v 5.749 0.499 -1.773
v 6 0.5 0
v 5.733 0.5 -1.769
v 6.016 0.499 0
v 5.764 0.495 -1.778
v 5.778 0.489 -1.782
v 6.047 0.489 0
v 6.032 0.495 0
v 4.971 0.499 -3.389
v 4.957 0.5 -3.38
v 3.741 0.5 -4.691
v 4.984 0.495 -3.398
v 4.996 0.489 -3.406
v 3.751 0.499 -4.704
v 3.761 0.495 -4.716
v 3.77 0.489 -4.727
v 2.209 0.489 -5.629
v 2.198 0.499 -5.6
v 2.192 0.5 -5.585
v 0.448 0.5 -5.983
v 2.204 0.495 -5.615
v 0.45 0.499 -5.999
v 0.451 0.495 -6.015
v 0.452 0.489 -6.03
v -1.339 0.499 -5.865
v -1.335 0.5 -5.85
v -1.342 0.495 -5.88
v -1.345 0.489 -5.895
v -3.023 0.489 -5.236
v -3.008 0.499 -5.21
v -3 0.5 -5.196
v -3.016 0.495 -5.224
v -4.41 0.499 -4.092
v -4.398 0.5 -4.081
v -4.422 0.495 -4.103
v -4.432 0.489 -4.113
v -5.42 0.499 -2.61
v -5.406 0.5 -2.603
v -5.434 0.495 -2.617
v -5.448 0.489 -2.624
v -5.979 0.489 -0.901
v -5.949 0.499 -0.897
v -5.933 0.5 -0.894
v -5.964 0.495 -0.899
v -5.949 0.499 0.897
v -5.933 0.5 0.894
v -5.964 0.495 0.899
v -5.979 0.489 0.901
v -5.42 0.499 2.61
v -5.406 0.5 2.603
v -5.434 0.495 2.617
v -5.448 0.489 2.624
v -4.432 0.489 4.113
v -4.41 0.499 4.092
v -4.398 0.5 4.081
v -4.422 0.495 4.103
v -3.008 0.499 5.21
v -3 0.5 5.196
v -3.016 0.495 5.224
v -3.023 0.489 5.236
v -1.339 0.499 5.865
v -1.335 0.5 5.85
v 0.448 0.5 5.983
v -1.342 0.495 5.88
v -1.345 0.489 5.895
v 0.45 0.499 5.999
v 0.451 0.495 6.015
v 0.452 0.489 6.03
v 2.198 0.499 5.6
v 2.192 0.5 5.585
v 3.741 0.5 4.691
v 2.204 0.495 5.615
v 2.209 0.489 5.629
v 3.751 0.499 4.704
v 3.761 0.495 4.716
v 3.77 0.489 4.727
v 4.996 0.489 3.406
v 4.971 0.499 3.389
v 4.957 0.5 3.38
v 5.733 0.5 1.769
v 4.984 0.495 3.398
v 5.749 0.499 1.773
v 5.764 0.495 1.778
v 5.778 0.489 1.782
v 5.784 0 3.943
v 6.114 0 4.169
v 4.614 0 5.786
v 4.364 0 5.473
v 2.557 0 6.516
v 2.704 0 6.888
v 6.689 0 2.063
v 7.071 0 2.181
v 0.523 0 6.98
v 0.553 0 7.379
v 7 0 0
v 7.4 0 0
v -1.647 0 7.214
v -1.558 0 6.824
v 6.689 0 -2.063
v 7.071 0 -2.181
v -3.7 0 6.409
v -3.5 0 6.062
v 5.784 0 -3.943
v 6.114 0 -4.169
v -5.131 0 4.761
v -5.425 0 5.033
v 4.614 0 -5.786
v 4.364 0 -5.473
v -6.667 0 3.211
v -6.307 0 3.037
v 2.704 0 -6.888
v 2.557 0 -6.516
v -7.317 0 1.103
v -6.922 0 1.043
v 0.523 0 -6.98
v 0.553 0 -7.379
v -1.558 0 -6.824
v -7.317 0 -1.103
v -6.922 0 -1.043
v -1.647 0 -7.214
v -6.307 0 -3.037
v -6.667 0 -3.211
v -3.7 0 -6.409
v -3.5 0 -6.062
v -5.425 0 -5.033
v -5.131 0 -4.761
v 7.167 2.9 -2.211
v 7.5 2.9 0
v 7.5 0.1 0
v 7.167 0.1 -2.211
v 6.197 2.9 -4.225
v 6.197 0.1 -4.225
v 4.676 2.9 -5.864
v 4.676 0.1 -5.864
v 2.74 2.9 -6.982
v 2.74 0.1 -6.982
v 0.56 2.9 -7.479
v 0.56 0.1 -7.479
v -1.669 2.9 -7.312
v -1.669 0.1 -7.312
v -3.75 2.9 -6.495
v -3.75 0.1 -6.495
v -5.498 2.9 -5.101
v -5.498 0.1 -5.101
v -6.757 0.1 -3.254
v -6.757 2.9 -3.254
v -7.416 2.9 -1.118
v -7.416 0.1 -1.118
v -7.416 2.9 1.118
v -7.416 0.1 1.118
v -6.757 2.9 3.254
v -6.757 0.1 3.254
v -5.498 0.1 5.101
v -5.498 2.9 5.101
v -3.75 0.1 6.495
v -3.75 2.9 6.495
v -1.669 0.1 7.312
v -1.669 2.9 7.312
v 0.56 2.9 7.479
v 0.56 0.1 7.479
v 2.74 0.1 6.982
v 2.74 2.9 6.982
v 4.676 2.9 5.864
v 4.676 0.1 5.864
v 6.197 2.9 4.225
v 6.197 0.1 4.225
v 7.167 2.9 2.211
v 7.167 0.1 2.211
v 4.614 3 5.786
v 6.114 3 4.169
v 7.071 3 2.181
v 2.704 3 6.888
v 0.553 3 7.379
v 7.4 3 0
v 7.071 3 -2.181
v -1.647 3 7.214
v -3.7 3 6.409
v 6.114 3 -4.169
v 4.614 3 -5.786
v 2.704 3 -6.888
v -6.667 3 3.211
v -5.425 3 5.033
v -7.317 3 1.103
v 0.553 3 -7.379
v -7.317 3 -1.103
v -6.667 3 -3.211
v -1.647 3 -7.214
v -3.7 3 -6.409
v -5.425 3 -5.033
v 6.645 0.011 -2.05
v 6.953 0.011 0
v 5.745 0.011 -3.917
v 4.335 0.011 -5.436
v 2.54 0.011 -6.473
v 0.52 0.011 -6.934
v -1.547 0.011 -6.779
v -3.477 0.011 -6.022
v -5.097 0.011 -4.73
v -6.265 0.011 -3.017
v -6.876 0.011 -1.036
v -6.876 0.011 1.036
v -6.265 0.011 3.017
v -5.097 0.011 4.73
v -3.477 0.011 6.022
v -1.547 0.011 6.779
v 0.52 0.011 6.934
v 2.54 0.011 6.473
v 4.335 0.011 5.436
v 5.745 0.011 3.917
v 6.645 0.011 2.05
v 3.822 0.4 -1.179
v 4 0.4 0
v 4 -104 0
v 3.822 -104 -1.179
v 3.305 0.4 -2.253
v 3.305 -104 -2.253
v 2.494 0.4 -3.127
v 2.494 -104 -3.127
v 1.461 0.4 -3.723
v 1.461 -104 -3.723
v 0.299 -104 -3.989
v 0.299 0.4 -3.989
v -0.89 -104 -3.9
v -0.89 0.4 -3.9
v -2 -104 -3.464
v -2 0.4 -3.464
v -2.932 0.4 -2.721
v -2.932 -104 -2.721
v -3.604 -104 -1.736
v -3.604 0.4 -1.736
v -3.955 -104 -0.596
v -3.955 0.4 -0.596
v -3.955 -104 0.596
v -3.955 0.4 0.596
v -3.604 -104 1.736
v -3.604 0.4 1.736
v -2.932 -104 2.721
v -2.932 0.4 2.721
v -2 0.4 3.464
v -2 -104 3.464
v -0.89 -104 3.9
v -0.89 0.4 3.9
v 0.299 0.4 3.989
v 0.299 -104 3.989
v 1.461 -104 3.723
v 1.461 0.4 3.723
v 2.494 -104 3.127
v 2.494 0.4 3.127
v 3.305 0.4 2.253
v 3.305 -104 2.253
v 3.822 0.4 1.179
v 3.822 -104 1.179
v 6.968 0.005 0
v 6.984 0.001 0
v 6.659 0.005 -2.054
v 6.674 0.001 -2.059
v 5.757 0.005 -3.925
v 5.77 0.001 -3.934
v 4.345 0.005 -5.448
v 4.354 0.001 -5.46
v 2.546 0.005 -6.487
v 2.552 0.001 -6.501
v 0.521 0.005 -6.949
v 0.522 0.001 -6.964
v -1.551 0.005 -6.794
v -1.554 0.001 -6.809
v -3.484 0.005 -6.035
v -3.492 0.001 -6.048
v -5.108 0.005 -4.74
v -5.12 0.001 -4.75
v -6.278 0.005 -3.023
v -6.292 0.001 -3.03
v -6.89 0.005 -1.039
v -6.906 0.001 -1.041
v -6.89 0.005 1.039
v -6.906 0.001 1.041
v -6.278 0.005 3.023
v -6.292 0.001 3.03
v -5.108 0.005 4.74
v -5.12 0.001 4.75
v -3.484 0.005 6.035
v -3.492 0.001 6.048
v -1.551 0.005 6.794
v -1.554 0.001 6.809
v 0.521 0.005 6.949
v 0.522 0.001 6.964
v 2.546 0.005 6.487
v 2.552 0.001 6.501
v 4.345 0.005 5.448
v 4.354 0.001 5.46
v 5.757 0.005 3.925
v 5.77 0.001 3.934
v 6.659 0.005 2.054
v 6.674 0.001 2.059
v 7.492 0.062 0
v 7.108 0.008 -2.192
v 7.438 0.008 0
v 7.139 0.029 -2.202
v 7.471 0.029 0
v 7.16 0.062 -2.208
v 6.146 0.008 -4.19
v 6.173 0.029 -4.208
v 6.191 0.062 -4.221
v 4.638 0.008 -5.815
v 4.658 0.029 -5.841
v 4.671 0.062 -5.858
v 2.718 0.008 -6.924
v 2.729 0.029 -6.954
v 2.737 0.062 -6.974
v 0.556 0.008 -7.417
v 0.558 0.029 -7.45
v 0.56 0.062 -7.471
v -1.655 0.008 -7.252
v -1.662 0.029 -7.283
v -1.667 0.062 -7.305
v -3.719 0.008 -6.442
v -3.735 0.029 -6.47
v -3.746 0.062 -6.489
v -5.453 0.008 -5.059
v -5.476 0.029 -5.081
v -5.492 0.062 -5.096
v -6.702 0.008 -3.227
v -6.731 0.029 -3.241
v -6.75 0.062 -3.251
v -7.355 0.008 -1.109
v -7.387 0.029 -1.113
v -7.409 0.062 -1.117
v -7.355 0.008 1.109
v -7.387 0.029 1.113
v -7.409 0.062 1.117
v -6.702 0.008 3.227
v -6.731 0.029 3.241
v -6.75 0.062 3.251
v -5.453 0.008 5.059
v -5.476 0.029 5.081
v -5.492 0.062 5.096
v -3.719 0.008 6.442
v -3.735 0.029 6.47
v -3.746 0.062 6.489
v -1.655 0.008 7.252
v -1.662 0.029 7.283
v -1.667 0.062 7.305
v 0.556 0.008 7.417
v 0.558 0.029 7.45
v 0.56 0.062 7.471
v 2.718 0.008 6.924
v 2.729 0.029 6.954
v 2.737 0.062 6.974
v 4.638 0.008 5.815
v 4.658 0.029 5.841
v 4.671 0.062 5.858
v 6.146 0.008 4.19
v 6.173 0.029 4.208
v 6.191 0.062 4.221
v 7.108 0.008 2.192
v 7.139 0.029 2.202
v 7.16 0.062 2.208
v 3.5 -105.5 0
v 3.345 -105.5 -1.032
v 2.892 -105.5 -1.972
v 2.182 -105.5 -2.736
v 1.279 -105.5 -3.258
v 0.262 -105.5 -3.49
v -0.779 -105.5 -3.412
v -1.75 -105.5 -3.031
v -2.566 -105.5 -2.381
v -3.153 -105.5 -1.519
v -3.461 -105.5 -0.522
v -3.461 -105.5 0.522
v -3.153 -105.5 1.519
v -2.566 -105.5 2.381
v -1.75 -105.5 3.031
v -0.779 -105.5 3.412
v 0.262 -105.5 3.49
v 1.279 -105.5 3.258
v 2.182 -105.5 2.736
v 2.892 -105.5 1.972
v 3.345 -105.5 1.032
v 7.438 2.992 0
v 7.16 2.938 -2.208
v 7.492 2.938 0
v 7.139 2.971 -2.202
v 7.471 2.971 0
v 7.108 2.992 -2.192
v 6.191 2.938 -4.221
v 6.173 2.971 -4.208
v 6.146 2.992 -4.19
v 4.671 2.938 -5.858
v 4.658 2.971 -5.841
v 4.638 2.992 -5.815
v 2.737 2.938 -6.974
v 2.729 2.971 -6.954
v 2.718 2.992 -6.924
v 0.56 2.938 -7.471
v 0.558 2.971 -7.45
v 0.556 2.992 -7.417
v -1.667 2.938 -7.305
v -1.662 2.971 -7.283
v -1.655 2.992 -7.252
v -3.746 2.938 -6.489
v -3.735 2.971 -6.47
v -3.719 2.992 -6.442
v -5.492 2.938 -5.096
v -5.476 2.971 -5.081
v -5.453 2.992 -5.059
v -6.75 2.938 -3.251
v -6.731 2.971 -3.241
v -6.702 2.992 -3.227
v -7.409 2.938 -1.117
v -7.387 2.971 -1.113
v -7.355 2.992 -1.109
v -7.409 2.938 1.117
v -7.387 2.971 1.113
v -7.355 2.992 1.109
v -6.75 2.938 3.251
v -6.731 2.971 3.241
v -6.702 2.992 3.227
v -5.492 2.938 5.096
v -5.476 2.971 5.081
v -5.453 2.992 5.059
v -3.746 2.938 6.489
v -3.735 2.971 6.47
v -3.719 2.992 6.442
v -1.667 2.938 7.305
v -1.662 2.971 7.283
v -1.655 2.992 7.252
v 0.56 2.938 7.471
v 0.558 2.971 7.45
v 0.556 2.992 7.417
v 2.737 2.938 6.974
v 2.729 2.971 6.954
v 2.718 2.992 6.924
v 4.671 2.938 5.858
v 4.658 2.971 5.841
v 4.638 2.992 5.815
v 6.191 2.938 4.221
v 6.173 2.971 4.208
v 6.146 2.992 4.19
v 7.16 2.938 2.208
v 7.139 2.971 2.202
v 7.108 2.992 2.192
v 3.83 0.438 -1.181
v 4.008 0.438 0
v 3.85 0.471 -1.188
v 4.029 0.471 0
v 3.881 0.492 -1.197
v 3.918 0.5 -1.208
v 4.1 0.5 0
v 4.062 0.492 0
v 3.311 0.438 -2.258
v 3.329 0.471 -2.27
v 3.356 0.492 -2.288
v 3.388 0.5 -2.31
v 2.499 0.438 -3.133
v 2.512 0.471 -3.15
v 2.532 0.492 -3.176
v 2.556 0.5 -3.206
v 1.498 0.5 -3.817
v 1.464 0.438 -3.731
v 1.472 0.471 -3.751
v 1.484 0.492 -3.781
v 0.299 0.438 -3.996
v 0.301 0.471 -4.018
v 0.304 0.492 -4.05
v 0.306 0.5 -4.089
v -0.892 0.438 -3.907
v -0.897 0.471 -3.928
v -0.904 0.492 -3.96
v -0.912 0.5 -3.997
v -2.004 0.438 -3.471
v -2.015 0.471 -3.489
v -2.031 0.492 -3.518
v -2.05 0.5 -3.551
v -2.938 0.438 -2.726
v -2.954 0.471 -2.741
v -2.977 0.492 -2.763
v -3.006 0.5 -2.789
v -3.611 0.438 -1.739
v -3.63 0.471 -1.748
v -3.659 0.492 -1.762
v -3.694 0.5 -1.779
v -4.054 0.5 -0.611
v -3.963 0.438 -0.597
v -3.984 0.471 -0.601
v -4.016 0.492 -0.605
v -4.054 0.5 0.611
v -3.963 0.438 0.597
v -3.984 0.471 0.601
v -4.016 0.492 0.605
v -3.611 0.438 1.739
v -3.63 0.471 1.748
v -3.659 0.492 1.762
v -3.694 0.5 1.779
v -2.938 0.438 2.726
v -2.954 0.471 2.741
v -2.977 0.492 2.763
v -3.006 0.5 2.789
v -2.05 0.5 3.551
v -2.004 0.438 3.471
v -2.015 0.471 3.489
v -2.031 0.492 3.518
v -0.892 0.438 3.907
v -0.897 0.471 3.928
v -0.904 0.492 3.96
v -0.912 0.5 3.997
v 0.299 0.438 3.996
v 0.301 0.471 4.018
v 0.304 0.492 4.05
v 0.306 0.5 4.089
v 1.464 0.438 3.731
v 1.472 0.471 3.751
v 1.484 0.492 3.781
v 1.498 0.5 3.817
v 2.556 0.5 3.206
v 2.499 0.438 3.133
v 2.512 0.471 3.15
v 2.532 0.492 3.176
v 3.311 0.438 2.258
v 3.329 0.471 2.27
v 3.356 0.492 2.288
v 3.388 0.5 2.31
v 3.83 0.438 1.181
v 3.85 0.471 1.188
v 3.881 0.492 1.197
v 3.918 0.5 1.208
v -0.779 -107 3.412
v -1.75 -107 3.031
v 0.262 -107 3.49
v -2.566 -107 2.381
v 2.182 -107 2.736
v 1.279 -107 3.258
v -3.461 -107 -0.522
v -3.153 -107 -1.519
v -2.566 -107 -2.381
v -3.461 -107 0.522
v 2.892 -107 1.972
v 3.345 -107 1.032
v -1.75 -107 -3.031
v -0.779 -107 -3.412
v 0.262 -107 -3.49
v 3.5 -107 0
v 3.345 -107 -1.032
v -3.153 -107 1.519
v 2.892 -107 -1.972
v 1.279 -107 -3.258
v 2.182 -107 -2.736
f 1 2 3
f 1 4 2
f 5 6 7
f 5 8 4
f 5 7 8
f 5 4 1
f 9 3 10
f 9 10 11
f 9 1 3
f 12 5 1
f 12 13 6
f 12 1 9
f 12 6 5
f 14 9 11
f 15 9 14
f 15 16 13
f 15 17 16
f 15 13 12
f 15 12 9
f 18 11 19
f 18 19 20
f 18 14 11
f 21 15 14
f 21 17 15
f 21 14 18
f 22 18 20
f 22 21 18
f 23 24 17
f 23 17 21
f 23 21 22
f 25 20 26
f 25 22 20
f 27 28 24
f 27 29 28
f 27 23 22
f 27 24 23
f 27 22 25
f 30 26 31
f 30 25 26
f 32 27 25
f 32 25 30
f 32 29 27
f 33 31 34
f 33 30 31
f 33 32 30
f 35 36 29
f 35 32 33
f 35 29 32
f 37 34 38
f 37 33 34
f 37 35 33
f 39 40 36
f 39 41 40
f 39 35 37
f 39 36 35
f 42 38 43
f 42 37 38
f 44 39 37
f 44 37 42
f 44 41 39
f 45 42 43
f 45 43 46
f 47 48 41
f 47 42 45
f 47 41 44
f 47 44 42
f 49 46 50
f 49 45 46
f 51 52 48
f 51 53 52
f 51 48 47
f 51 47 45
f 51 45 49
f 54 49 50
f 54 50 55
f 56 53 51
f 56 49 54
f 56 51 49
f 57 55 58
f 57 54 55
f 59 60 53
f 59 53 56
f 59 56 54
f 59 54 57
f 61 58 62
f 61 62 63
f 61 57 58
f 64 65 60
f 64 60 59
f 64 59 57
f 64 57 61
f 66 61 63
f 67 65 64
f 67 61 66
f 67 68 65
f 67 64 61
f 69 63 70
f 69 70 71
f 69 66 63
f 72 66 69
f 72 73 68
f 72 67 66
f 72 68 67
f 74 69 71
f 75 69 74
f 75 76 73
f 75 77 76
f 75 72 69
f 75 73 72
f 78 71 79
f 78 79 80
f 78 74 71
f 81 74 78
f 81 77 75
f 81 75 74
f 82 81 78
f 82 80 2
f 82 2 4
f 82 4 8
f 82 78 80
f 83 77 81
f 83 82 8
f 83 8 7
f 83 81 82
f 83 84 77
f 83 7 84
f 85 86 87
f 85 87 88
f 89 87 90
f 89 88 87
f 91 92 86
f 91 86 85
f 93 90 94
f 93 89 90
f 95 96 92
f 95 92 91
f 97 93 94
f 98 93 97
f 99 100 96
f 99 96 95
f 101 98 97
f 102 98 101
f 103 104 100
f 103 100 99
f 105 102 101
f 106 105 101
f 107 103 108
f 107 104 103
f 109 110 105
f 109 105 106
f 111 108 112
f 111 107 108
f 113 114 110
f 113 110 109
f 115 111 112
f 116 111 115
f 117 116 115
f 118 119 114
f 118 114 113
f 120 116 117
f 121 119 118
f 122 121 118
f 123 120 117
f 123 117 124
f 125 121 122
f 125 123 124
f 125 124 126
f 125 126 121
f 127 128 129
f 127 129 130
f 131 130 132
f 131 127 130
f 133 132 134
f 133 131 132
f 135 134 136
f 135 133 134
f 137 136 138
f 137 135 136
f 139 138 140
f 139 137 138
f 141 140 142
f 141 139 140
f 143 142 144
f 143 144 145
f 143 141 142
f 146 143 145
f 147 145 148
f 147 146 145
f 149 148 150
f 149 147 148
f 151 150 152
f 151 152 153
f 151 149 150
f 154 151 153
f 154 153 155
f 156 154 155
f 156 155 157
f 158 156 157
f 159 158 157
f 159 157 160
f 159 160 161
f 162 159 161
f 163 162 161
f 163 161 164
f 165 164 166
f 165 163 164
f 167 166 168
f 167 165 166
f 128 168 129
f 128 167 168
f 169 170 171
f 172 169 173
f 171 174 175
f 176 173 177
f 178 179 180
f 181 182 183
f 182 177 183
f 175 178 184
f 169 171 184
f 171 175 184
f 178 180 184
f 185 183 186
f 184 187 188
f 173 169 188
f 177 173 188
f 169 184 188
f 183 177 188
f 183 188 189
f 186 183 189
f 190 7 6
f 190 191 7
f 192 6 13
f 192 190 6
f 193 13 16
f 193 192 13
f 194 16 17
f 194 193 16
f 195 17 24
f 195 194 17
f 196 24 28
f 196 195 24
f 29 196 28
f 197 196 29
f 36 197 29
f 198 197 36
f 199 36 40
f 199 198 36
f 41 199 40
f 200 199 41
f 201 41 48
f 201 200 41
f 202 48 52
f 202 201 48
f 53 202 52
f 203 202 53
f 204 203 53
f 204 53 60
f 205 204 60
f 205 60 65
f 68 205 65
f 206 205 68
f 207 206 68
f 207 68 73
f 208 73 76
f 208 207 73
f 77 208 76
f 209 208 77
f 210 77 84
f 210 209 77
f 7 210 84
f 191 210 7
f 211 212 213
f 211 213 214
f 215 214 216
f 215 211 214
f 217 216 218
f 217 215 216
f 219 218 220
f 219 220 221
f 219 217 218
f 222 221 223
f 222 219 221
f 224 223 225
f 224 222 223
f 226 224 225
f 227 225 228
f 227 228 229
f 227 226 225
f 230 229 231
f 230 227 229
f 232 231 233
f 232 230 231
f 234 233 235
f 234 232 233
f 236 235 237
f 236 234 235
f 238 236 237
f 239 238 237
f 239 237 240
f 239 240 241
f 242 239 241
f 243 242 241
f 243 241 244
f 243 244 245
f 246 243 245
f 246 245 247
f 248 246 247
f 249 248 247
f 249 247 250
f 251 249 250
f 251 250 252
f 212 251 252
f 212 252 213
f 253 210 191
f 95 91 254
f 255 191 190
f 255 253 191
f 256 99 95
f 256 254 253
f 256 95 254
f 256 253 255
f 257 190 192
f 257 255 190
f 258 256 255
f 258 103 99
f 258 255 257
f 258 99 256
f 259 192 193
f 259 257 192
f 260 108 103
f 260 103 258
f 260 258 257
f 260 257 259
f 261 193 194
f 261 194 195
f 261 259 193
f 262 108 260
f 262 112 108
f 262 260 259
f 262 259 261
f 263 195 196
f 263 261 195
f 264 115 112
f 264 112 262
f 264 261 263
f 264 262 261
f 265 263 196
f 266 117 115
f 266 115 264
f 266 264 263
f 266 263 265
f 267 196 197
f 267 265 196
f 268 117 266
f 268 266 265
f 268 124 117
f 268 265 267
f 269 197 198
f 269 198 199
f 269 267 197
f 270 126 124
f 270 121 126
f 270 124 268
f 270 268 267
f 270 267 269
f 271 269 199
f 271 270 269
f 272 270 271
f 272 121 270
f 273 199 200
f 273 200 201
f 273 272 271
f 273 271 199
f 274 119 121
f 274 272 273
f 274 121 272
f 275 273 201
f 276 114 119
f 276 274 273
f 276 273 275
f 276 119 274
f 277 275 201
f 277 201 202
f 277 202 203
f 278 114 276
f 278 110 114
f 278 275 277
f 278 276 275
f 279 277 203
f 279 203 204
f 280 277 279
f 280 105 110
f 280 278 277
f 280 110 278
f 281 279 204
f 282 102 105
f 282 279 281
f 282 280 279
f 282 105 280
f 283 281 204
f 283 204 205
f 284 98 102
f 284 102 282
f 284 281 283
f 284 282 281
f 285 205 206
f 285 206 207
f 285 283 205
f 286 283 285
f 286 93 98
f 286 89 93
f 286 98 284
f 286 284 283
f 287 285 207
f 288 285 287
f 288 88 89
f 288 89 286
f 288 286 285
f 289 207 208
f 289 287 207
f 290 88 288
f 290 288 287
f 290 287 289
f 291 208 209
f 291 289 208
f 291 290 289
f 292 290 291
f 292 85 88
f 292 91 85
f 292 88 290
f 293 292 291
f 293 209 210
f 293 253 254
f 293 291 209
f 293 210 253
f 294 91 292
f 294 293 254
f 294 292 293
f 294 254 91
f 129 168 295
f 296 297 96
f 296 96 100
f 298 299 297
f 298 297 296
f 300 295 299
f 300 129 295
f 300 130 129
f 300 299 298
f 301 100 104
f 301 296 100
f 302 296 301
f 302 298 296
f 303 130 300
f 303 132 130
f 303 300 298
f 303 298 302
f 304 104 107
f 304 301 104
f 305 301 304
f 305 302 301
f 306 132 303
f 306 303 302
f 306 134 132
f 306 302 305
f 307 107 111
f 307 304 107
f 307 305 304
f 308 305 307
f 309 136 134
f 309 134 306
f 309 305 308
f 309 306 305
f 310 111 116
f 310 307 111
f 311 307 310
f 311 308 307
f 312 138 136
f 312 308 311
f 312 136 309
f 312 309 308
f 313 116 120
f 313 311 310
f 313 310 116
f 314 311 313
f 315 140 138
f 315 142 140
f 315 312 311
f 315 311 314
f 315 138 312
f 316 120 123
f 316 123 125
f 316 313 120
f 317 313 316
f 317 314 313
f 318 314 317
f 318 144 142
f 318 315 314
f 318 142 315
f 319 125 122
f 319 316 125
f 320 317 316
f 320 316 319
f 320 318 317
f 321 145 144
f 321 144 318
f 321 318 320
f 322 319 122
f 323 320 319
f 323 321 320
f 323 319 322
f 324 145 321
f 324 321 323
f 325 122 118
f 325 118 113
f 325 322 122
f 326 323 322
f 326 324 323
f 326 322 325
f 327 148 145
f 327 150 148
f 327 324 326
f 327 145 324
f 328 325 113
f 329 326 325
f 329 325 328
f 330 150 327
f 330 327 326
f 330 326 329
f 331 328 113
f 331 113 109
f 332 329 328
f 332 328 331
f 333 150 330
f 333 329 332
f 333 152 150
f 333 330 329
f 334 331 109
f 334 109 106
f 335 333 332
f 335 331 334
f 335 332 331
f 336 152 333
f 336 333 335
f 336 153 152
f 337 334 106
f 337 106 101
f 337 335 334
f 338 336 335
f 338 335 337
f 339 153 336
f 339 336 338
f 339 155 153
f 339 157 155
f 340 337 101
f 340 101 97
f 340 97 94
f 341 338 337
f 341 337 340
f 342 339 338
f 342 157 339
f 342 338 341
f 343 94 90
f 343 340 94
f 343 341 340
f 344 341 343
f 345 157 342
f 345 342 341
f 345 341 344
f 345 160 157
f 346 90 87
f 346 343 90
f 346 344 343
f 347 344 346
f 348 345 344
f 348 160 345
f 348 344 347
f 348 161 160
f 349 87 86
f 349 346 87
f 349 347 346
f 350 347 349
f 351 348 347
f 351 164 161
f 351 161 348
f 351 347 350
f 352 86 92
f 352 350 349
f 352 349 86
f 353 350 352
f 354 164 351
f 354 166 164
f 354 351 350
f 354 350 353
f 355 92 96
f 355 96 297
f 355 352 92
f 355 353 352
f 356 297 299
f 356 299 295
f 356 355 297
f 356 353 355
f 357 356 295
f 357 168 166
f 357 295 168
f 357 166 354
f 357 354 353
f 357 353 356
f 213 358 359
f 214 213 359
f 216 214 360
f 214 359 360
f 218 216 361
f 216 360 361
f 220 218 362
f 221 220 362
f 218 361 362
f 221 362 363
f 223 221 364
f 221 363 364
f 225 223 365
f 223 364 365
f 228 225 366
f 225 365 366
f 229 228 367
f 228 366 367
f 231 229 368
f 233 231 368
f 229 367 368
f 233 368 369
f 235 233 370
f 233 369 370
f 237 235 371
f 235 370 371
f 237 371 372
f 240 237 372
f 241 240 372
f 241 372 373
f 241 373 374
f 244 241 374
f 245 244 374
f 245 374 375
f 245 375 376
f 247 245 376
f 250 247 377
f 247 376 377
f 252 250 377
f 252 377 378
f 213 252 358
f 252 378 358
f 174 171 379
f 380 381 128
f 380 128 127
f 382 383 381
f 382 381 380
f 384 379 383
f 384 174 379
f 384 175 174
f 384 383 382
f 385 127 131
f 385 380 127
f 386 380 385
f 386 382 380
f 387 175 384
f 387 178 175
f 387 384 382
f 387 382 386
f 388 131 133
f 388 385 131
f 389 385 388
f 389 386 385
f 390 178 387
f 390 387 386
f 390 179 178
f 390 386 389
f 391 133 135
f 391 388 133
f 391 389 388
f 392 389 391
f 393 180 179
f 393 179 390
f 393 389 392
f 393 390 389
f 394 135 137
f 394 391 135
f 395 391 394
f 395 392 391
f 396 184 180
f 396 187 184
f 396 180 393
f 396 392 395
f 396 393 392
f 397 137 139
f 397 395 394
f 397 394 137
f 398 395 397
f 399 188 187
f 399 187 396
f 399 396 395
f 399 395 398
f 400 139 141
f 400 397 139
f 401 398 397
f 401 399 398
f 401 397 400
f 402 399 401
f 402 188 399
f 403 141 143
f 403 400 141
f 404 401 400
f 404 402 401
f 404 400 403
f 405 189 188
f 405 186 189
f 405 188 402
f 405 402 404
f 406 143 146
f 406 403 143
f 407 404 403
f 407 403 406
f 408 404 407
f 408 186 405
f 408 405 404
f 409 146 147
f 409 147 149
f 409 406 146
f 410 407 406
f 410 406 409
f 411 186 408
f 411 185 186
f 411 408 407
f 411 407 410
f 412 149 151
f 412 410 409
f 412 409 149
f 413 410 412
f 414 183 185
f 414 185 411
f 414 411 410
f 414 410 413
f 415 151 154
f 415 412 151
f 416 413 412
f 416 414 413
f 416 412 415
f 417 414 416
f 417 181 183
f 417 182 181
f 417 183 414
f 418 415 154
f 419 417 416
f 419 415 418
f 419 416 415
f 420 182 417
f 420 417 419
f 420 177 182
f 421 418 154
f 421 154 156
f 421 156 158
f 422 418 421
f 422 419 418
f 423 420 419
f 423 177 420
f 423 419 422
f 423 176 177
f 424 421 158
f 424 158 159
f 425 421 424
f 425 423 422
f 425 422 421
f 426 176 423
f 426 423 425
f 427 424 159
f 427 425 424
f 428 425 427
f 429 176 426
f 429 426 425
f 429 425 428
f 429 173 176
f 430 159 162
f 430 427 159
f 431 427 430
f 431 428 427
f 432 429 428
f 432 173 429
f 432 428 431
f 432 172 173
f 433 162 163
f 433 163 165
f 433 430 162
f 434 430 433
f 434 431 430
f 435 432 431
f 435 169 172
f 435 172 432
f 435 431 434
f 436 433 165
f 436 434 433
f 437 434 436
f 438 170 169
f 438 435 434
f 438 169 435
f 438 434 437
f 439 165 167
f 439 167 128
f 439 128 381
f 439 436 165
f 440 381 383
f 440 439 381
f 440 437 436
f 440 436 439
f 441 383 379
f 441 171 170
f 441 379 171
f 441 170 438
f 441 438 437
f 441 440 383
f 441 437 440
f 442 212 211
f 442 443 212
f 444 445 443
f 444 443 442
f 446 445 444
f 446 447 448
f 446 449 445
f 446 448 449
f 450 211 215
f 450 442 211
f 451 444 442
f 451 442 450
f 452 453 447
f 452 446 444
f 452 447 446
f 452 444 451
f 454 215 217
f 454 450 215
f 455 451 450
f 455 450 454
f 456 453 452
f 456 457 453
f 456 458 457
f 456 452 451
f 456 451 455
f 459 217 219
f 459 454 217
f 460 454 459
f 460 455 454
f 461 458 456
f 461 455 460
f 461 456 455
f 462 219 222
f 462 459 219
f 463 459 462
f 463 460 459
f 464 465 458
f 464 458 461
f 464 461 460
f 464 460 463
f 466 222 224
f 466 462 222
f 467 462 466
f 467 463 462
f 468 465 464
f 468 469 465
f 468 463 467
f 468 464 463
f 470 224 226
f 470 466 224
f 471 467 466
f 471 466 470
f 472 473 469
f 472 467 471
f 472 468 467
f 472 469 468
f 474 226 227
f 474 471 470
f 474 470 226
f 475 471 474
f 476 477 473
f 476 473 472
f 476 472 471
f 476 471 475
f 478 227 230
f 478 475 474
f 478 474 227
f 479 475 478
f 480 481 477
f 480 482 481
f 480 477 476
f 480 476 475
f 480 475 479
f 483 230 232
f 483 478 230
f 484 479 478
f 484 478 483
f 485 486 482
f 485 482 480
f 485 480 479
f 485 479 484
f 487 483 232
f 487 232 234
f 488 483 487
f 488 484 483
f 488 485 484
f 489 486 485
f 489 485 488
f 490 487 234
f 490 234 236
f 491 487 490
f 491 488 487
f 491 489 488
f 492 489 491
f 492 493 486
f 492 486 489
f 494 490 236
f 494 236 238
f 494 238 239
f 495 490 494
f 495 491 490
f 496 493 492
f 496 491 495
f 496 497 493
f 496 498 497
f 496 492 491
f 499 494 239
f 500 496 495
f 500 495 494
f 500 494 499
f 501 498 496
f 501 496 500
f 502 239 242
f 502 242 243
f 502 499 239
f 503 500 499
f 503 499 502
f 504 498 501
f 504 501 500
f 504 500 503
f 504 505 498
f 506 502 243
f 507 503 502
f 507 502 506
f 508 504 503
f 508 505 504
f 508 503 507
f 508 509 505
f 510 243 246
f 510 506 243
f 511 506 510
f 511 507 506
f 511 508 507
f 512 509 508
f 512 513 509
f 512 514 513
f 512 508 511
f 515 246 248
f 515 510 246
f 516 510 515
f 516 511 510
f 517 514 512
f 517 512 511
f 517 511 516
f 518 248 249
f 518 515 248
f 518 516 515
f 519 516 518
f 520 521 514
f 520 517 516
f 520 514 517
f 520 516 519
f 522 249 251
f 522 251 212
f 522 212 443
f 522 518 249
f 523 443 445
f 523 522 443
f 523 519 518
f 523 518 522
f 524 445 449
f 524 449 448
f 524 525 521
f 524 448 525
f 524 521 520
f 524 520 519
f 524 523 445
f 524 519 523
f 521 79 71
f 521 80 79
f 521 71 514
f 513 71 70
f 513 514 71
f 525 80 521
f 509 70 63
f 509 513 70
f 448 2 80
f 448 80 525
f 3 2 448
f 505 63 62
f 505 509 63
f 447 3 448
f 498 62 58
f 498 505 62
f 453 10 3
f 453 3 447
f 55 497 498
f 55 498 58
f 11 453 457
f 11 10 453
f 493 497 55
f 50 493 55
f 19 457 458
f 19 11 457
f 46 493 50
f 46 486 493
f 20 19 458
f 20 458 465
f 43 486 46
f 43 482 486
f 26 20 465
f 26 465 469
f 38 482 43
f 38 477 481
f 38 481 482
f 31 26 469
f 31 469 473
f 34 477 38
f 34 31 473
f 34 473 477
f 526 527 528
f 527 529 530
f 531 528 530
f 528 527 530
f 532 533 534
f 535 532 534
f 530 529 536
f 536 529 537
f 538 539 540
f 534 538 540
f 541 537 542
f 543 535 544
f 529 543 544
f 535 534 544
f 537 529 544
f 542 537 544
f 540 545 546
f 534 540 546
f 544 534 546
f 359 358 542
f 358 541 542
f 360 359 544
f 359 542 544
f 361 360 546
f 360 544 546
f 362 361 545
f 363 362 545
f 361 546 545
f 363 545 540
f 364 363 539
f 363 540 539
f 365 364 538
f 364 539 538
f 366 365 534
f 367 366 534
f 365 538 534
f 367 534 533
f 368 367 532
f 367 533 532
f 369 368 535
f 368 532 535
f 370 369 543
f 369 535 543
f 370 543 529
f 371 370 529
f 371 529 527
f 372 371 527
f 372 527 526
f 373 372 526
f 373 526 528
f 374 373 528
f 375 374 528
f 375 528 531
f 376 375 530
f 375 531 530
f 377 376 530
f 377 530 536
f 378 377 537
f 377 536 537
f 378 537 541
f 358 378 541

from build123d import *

# Parameters (mm, degrees)
MAINBODYS_R    = 4
MAINBODY_DEPTH = 104
HEADS_W        = 7.5
HEADS_H        = 3
HEADFILLET_R   = 0.1


with BuildPart() as part:
    # MainBodyS → MainBody (new body)
    with BuildSketch(Plane(origin=(0, 0, 0), x_dir=(1, 0, 0), z_dir=(0, 1, 0))):
        Circle(MAINBODYS_R)
    extrude(amount=-MAINBODY_DEPTH)

    # HeadS → Head (revolve)
    with BuildSketch(Plane.XY):
        with Locations((3.75, 1.5)):
            Rectangle(HEADS_W, HEADS_H)
    revolve(axis=Axis((0, 0, 0), (0, 1, 0)))

    # HeadIndentS → HeadIndent (revolve, cut)
    with BuildSketch(Plane.XY):
        with BuildLine():
            Line((4, 0), (4, 0.4))
            ThreePointArc((4, 0.4), (4.029289322, 0.470710678), (4.1, 0.5))
            Line((4.1, 0.5), (6, 0.5))
            ThreePointArc((6, 0.5), (6.023974846, 0.497083504), (6.046551241, 0.488504135))
            Line((6.046551241, 0.488504135), (6.953448759, 0.011495865))
            ThreePointArc((6.953448759, 0.011495865), (6.976025154, 0.002916496), (7, 0))
            Line((7, 0), (4, 0))
        make_face()
    revolve(axis=Axis((0, 0, 0), (0, 1, 0)), mode=Mode.SUBTRACT)

    # BottomTipS → BottomTip (revolve)
    with BuildSketch(Plane.XY):
        Polygon((4, -104), (3.5, -105.5), (3.5, -107), (0, -107), (0, -104), align=None)
    revolve(axis=Axis((0, -107, 0), (0, 1, 0)))

    # HeadFillet
    headfillet_edges = [part.edges().sort_by_distance(p)[0] for p in [
        (-7.5, 0, 0),
        (-7.5, 3, 0),
    ]]
    fillet(headfillet_edges, radius=HEADFILLET_R)


solid = part.part
